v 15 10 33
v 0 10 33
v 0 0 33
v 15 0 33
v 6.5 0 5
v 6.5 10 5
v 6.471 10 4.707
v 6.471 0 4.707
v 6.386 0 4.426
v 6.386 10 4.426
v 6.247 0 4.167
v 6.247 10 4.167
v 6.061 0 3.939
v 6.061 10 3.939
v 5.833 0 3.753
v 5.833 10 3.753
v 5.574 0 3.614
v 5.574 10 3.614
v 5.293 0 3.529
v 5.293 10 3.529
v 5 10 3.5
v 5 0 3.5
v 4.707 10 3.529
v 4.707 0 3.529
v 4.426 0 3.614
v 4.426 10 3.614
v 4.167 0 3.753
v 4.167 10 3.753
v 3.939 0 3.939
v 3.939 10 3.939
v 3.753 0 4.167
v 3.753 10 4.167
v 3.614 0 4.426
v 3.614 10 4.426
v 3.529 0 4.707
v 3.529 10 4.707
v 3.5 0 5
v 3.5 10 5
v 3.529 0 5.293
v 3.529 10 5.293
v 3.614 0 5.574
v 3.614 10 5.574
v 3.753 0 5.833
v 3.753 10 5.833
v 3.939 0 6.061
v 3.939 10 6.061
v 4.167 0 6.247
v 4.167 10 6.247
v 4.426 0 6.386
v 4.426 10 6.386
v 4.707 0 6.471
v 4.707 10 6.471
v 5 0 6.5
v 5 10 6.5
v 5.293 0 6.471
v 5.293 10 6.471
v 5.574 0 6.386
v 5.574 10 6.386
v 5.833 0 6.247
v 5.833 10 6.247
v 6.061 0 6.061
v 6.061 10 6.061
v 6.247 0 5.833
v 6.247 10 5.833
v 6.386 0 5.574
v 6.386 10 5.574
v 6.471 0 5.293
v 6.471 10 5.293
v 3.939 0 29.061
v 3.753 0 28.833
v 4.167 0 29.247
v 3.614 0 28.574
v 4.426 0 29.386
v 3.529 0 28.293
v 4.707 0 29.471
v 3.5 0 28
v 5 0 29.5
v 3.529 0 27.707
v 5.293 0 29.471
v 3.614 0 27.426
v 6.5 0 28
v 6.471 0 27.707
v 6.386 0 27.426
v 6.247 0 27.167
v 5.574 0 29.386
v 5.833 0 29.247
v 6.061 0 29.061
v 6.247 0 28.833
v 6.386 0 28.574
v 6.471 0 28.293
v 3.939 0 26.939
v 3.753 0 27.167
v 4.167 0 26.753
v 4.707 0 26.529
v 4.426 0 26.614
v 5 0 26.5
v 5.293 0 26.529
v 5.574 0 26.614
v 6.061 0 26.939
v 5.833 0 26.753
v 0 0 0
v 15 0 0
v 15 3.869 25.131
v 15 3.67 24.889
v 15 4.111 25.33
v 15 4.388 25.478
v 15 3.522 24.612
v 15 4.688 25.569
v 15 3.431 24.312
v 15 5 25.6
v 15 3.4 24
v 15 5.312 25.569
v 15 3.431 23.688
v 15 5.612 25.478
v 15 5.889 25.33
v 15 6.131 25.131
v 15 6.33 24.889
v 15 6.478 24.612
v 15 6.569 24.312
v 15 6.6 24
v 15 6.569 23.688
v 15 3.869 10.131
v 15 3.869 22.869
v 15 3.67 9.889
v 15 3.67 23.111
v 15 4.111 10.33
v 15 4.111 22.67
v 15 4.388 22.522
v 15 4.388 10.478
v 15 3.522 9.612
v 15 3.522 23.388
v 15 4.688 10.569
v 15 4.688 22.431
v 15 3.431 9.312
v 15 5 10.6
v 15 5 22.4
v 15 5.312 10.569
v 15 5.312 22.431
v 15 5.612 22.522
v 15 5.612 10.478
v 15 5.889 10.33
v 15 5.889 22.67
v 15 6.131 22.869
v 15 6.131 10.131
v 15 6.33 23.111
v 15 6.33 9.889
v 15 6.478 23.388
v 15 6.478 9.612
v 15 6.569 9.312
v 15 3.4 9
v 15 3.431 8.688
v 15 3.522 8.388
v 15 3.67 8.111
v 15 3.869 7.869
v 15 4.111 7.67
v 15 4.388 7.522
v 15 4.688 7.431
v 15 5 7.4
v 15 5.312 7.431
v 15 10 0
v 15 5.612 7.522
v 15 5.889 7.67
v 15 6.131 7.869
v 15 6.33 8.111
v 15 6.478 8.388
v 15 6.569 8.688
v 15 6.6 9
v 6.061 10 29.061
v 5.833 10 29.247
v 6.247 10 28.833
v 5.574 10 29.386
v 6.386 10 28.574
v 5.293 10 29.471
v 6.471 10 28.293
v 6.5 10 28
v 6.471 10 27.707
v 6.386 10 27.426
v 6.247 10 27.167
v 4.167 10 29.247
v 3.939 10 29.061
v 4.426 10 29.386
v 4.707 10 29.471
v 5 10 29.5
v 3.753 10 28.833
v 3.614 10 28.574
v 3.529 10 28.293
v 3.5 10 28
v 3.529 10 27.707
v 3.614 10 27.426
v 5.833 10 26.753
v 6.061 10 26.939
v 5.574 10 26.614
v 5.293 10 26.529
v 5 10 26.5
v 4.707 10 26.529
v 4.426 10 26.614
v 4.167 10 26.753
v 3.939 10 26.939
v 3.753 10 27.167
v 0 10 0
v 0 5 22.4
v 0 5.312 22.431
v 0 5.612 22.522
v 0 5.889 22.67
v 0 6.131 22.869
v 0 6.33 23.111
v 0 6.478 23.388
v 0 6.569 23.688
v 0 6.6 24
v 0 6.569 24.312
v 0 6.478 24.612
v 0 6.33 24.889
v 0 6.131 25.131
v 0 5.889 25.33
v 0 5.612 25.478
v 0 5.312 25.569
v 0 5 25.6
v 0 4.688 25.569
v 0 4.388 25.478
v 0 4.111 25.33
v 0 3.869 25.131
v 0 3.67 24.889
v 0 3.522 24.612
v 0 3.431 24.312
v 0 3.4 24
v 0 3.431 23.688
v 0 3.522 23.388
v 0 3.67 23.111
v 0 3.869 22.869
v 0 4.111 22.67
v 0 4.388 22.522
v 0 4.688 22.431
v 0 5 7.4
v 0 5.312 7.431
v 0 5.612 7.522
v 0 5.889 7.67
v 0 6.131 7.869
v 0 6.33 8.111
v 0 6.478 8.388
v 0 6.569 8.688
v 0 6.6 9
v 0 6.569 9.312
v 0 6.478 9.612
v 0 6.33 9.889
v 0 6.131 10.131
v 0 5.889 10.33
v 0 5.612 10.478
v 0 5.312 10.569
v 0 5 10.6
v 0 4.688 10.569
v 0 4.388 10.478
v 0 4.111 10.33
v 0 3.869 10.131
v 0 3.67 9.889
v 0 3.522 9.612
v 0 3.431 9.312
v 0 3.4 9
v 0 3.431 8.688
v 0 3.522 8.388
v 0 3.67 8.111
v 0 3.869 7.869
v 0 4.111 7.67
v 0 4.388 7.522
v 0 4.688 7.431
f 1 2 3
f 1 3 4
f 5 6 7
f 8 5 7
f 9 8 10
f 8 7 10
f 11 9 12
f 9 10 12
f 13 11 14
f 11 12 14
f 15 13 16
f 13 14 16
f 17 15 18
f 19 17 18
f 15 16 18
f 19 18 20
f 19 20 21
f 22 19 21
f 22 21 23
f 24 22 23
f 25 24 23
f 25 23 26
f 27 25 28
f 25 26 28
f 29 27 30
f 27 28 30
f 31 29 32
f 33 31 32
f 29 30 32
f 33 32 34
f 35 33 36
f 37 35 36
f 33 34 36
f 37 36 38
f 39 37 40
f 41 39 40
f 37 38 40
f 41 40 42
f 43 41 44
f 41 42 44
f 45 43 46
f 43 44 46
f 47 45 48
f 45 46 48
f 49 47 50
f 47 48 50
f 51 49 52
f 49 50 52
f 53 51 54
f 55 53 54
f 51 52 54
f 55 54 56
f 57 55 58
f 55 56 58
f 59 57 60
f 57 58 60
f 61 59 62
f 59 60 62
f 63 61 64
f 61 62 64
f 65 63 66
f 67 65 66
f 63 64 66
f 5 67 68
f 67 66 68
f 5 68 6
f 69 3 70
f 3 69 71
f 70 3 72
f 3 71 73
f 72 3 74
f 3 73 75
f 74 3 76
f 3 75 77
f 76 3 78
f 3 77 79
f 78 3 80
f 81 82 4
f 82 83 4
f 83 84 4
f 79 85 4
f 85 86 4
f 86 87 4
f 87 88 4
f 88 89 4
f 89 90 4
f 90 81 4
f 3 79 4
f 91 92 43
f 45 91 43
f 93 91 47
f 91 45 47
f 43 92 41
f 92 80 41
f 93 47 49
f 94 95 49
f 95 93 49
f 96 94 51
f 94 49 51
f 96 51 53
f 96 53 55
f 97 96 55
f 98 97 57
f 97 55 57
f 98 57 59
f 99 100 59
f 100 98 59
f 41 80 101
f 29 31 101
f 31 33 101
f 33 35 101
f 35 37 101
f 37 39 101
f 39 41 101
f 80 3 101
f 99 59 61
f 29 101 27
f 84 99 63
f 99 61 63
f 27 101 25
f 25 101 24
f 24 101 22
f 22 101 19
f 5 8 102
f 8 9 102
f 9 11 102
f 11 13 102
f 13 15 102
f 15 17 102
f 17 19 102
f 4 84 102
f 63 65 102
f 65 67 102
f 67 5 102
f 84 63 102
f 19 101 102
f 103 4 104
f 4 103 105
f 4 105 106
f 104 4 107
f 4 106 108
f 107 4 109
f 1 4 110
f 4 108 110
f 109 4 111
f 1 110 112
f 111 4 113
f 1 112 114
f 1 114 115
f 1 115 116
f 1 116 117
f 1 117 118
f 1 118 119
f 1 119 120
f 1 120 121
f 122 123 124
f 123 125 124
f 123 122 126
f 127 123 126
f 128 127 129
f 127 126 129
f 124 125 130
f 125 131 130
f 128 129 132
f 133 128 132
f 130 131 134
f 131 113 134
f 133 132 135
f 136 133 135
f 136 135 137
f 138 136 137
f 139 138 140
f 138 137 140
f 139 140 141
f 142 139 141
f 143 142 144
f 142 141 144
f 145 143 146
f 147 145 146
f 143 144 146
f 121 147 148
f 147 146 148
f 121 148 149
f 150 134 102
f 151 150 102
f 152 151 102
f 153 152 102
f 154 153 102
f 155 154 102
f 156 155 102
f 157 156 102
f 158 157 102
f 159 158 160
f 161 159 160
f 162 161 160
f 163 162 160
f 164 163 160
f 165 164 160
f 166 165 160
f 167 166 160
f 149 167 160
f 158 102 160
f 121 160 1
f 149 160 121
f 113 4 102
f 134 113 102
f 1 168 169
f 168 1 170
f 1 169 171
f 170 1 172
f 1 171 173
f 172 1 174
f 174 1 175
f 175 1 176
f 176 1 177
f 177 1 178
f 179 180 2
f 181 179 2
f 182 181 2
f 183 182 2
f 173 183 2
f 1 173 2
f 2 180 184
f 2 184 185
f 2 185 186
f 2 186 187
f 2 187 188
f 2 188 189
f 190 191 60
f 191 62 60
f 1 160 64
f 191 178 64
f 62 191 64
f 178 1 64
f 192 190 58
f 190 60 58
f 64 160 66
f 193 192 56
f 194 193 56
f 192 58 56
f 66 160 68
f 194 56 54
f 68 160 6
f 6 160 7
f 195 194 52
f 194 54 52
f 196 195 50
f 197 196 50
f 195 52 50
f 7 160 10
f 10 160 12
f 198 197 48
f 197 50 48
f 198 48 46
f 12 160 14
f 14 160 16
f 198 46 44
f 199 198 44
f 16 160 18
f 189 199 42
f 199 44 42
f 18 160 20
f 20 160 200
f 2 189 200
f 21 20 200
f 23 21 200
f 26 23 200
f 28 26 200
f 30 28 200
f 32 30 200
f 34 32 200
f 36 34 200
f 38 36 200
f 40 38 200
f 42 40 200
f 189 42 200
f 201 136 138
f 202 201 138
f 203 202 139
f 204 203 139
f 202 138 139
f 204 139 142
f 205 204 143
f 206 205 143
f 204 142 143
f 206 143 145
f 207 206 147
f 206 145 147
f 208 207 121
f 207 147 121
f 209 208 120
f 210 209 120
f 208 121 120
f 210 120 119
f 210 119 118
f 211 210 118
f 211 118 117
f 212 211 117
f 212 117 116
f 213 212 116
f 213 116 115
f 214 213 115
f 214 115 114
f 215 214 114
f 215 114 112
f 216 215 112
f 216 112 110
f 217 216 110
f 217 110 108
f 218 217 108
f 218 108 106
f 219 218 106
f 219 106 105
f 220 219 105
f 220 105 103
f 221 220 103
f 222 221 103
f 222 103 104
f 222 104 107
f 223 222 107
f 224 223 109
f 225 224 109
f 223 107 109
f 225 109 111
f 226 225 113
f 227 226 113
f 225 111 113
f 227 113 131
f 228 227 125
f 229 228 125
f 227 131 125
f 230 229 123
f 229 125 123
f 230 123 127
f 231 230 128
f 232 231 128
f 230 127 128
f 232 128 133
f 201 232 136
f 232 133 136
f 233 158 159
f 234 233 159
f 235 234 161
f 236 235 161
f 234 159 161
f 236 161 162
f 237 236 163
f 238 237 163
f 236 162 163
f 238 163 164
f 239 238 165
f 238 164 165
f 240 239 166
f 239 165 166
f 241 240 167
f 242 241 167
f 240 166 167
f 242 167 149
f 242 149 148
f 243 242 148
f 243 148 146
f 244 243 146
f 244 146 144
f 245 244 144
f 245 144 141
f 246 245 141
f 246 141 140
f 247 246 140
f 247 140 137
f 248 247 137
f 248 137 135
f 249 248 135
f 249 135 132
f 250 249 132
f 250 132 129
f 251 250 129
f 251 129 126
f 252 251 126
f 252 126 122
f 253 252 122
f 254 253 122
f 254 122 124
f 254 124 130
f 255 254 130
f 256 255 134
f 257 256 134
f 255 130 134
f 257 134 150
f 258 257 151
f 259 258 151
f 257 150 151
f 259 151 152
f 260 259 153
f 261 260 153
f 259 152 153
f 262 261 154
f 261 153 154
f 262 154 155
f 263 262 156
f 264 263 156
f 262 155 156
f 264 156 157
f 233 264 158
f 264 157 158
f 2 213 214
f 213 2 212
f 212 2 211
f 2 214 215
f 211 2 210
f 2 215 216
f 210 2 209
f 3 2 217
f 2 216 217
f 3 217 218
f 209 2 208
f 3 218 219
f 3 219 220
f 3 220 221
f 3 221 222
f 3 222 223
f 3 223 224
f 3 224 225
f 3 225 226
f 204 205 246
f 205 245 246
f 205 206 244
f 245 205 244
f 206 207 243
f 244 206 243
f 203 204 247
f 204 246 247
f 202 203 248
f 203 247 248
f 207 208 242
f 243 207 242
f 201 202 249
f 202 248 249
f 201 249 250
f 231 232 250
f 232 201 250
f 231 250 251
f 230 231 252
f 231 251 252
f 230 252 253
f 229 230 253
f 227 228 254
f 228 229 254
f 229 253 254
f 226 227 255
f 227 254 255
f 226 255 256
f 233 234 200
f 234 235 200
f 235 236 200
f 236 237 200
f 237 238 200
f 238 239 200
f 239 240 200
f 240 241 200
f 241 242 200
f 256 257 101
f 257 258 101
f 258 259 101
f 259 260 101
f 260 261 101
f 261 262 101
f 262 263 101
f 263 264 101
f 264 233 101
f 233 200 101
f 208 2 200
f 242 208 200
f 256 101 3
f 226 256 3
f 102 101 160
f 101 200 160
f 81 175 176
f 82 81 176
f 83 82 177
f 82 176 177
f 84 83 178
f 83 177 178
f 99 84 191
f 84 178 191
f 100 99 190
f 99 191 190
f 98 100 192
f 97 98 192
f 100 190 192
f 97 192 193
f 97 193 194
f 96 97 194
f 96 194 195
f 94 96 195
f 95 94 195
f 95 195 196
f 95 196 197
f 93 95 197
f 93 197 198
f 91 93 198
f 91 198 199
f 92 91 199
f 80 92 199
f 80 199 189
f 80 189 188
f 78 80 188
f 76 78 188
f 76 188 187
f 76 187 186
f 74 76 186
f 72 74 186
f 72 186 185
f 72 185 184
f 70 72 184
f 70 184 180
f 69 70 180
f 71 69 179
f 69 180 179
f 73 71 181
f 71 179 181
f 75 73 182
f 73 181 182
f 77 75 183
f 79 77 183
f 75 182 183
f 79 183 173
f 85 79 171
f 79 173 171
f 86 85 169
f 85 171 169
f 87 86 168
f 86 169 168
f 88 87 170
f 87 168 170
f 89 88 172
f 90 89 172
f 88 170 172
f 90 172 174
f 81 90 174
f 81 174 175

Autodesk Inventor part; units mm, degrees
ref_plane "YZ Plane" through (0, 0, 0) normal (1, 0, 0) x (0, 1, 0)
ref_plane "XZ Plane" through (0, 0, 0) normal (0, 1, 0) x (-1, 0, 0)
ref_plane "XY Plane" through (0, 0, 0) normal (0, 0, 1) x (1, 0, 0)
sketch "Sketch1" plane through (0, 0, 0) normal (0, 0, 1) x (1, 0, 0)
  line L0 (0, 0) -> (15, 0)
  line L1 (15, 0) -> (15, 10)
  line L2 (15, 10) -> (0, 10)
  line L3 (0, 10) -> (0, 0)
  line L4 (1, 9) -> (14, 9)
  line L5 (14, 9) -> (14, 1)
  line L6 (14, 1) -> (1, 1)
  line L7 (1, 1) -> (1, 9)
  dimension "d0" = 15
  dimension "d1" = 10
  dimension "d2" = 13
  dimension "d3" = 8
  dimension "d4" = 1
  dimension "d5" = 1
extrude "Extrusion1" add sketch "Sketch1" along normal blind 33 contours L3 L2 L1 L0 | L4 L5 L6 L7
sketch "Sketch2" plane through (0, 10, 0) normal (0, 1, 0) x (1, 0, 0)
  line L0 (15, 0) -> (0, 0) projected
  line L1 (0, 0) -> (0, -33) projected
  line L2 (15, -33) -> (0, -33) projected
  line L3 (15, 0) -> (15, -33) projected
  circle A0 centre (5, -5) radius 1.5
  circle A1 centre (5, -28) radius 1.5
  dimension "d8" = 3
  dimension "d9" = 3
  dimension "d10" = 5
  dimension "d11" = 5
  dimension "d12" = 5
  dimension "d13" = 5
extrude "Extrusion2" cut sketch "Sketch2" against normal up to surface (10 mm away) contours A0 | A1
sketch "Sketch3" plane through (15, 0, 0) normal (1, 0, 0) x (0, 0, -1)
  line L0 (0, 0) -> (0, 10) projected
  line L1 (0, 10) -> (-33, 10) projected
  line L2 (-33, 0) -> (-33, 10) projected
  line L3 (0, 0) -> (-33, 0) projected
  circle A0 centre (-9, 5) radius 1.6
  circle A1 centre (-24, 5) radius 1.6
  dimension "d16" = 3.2
  dimension "d17" = 5
  dimension "d18" = 9
  dimension "d21" = 3.2
  dimension "d22" = 5
  dimension "d23" = 9
extrude "Extrusion3" cut sketch "Sketch3" against normal up to surface (15 mm away) contours A0 | A1
properties part number "profile2_3D" material "Aluminum 6061, Welded"
